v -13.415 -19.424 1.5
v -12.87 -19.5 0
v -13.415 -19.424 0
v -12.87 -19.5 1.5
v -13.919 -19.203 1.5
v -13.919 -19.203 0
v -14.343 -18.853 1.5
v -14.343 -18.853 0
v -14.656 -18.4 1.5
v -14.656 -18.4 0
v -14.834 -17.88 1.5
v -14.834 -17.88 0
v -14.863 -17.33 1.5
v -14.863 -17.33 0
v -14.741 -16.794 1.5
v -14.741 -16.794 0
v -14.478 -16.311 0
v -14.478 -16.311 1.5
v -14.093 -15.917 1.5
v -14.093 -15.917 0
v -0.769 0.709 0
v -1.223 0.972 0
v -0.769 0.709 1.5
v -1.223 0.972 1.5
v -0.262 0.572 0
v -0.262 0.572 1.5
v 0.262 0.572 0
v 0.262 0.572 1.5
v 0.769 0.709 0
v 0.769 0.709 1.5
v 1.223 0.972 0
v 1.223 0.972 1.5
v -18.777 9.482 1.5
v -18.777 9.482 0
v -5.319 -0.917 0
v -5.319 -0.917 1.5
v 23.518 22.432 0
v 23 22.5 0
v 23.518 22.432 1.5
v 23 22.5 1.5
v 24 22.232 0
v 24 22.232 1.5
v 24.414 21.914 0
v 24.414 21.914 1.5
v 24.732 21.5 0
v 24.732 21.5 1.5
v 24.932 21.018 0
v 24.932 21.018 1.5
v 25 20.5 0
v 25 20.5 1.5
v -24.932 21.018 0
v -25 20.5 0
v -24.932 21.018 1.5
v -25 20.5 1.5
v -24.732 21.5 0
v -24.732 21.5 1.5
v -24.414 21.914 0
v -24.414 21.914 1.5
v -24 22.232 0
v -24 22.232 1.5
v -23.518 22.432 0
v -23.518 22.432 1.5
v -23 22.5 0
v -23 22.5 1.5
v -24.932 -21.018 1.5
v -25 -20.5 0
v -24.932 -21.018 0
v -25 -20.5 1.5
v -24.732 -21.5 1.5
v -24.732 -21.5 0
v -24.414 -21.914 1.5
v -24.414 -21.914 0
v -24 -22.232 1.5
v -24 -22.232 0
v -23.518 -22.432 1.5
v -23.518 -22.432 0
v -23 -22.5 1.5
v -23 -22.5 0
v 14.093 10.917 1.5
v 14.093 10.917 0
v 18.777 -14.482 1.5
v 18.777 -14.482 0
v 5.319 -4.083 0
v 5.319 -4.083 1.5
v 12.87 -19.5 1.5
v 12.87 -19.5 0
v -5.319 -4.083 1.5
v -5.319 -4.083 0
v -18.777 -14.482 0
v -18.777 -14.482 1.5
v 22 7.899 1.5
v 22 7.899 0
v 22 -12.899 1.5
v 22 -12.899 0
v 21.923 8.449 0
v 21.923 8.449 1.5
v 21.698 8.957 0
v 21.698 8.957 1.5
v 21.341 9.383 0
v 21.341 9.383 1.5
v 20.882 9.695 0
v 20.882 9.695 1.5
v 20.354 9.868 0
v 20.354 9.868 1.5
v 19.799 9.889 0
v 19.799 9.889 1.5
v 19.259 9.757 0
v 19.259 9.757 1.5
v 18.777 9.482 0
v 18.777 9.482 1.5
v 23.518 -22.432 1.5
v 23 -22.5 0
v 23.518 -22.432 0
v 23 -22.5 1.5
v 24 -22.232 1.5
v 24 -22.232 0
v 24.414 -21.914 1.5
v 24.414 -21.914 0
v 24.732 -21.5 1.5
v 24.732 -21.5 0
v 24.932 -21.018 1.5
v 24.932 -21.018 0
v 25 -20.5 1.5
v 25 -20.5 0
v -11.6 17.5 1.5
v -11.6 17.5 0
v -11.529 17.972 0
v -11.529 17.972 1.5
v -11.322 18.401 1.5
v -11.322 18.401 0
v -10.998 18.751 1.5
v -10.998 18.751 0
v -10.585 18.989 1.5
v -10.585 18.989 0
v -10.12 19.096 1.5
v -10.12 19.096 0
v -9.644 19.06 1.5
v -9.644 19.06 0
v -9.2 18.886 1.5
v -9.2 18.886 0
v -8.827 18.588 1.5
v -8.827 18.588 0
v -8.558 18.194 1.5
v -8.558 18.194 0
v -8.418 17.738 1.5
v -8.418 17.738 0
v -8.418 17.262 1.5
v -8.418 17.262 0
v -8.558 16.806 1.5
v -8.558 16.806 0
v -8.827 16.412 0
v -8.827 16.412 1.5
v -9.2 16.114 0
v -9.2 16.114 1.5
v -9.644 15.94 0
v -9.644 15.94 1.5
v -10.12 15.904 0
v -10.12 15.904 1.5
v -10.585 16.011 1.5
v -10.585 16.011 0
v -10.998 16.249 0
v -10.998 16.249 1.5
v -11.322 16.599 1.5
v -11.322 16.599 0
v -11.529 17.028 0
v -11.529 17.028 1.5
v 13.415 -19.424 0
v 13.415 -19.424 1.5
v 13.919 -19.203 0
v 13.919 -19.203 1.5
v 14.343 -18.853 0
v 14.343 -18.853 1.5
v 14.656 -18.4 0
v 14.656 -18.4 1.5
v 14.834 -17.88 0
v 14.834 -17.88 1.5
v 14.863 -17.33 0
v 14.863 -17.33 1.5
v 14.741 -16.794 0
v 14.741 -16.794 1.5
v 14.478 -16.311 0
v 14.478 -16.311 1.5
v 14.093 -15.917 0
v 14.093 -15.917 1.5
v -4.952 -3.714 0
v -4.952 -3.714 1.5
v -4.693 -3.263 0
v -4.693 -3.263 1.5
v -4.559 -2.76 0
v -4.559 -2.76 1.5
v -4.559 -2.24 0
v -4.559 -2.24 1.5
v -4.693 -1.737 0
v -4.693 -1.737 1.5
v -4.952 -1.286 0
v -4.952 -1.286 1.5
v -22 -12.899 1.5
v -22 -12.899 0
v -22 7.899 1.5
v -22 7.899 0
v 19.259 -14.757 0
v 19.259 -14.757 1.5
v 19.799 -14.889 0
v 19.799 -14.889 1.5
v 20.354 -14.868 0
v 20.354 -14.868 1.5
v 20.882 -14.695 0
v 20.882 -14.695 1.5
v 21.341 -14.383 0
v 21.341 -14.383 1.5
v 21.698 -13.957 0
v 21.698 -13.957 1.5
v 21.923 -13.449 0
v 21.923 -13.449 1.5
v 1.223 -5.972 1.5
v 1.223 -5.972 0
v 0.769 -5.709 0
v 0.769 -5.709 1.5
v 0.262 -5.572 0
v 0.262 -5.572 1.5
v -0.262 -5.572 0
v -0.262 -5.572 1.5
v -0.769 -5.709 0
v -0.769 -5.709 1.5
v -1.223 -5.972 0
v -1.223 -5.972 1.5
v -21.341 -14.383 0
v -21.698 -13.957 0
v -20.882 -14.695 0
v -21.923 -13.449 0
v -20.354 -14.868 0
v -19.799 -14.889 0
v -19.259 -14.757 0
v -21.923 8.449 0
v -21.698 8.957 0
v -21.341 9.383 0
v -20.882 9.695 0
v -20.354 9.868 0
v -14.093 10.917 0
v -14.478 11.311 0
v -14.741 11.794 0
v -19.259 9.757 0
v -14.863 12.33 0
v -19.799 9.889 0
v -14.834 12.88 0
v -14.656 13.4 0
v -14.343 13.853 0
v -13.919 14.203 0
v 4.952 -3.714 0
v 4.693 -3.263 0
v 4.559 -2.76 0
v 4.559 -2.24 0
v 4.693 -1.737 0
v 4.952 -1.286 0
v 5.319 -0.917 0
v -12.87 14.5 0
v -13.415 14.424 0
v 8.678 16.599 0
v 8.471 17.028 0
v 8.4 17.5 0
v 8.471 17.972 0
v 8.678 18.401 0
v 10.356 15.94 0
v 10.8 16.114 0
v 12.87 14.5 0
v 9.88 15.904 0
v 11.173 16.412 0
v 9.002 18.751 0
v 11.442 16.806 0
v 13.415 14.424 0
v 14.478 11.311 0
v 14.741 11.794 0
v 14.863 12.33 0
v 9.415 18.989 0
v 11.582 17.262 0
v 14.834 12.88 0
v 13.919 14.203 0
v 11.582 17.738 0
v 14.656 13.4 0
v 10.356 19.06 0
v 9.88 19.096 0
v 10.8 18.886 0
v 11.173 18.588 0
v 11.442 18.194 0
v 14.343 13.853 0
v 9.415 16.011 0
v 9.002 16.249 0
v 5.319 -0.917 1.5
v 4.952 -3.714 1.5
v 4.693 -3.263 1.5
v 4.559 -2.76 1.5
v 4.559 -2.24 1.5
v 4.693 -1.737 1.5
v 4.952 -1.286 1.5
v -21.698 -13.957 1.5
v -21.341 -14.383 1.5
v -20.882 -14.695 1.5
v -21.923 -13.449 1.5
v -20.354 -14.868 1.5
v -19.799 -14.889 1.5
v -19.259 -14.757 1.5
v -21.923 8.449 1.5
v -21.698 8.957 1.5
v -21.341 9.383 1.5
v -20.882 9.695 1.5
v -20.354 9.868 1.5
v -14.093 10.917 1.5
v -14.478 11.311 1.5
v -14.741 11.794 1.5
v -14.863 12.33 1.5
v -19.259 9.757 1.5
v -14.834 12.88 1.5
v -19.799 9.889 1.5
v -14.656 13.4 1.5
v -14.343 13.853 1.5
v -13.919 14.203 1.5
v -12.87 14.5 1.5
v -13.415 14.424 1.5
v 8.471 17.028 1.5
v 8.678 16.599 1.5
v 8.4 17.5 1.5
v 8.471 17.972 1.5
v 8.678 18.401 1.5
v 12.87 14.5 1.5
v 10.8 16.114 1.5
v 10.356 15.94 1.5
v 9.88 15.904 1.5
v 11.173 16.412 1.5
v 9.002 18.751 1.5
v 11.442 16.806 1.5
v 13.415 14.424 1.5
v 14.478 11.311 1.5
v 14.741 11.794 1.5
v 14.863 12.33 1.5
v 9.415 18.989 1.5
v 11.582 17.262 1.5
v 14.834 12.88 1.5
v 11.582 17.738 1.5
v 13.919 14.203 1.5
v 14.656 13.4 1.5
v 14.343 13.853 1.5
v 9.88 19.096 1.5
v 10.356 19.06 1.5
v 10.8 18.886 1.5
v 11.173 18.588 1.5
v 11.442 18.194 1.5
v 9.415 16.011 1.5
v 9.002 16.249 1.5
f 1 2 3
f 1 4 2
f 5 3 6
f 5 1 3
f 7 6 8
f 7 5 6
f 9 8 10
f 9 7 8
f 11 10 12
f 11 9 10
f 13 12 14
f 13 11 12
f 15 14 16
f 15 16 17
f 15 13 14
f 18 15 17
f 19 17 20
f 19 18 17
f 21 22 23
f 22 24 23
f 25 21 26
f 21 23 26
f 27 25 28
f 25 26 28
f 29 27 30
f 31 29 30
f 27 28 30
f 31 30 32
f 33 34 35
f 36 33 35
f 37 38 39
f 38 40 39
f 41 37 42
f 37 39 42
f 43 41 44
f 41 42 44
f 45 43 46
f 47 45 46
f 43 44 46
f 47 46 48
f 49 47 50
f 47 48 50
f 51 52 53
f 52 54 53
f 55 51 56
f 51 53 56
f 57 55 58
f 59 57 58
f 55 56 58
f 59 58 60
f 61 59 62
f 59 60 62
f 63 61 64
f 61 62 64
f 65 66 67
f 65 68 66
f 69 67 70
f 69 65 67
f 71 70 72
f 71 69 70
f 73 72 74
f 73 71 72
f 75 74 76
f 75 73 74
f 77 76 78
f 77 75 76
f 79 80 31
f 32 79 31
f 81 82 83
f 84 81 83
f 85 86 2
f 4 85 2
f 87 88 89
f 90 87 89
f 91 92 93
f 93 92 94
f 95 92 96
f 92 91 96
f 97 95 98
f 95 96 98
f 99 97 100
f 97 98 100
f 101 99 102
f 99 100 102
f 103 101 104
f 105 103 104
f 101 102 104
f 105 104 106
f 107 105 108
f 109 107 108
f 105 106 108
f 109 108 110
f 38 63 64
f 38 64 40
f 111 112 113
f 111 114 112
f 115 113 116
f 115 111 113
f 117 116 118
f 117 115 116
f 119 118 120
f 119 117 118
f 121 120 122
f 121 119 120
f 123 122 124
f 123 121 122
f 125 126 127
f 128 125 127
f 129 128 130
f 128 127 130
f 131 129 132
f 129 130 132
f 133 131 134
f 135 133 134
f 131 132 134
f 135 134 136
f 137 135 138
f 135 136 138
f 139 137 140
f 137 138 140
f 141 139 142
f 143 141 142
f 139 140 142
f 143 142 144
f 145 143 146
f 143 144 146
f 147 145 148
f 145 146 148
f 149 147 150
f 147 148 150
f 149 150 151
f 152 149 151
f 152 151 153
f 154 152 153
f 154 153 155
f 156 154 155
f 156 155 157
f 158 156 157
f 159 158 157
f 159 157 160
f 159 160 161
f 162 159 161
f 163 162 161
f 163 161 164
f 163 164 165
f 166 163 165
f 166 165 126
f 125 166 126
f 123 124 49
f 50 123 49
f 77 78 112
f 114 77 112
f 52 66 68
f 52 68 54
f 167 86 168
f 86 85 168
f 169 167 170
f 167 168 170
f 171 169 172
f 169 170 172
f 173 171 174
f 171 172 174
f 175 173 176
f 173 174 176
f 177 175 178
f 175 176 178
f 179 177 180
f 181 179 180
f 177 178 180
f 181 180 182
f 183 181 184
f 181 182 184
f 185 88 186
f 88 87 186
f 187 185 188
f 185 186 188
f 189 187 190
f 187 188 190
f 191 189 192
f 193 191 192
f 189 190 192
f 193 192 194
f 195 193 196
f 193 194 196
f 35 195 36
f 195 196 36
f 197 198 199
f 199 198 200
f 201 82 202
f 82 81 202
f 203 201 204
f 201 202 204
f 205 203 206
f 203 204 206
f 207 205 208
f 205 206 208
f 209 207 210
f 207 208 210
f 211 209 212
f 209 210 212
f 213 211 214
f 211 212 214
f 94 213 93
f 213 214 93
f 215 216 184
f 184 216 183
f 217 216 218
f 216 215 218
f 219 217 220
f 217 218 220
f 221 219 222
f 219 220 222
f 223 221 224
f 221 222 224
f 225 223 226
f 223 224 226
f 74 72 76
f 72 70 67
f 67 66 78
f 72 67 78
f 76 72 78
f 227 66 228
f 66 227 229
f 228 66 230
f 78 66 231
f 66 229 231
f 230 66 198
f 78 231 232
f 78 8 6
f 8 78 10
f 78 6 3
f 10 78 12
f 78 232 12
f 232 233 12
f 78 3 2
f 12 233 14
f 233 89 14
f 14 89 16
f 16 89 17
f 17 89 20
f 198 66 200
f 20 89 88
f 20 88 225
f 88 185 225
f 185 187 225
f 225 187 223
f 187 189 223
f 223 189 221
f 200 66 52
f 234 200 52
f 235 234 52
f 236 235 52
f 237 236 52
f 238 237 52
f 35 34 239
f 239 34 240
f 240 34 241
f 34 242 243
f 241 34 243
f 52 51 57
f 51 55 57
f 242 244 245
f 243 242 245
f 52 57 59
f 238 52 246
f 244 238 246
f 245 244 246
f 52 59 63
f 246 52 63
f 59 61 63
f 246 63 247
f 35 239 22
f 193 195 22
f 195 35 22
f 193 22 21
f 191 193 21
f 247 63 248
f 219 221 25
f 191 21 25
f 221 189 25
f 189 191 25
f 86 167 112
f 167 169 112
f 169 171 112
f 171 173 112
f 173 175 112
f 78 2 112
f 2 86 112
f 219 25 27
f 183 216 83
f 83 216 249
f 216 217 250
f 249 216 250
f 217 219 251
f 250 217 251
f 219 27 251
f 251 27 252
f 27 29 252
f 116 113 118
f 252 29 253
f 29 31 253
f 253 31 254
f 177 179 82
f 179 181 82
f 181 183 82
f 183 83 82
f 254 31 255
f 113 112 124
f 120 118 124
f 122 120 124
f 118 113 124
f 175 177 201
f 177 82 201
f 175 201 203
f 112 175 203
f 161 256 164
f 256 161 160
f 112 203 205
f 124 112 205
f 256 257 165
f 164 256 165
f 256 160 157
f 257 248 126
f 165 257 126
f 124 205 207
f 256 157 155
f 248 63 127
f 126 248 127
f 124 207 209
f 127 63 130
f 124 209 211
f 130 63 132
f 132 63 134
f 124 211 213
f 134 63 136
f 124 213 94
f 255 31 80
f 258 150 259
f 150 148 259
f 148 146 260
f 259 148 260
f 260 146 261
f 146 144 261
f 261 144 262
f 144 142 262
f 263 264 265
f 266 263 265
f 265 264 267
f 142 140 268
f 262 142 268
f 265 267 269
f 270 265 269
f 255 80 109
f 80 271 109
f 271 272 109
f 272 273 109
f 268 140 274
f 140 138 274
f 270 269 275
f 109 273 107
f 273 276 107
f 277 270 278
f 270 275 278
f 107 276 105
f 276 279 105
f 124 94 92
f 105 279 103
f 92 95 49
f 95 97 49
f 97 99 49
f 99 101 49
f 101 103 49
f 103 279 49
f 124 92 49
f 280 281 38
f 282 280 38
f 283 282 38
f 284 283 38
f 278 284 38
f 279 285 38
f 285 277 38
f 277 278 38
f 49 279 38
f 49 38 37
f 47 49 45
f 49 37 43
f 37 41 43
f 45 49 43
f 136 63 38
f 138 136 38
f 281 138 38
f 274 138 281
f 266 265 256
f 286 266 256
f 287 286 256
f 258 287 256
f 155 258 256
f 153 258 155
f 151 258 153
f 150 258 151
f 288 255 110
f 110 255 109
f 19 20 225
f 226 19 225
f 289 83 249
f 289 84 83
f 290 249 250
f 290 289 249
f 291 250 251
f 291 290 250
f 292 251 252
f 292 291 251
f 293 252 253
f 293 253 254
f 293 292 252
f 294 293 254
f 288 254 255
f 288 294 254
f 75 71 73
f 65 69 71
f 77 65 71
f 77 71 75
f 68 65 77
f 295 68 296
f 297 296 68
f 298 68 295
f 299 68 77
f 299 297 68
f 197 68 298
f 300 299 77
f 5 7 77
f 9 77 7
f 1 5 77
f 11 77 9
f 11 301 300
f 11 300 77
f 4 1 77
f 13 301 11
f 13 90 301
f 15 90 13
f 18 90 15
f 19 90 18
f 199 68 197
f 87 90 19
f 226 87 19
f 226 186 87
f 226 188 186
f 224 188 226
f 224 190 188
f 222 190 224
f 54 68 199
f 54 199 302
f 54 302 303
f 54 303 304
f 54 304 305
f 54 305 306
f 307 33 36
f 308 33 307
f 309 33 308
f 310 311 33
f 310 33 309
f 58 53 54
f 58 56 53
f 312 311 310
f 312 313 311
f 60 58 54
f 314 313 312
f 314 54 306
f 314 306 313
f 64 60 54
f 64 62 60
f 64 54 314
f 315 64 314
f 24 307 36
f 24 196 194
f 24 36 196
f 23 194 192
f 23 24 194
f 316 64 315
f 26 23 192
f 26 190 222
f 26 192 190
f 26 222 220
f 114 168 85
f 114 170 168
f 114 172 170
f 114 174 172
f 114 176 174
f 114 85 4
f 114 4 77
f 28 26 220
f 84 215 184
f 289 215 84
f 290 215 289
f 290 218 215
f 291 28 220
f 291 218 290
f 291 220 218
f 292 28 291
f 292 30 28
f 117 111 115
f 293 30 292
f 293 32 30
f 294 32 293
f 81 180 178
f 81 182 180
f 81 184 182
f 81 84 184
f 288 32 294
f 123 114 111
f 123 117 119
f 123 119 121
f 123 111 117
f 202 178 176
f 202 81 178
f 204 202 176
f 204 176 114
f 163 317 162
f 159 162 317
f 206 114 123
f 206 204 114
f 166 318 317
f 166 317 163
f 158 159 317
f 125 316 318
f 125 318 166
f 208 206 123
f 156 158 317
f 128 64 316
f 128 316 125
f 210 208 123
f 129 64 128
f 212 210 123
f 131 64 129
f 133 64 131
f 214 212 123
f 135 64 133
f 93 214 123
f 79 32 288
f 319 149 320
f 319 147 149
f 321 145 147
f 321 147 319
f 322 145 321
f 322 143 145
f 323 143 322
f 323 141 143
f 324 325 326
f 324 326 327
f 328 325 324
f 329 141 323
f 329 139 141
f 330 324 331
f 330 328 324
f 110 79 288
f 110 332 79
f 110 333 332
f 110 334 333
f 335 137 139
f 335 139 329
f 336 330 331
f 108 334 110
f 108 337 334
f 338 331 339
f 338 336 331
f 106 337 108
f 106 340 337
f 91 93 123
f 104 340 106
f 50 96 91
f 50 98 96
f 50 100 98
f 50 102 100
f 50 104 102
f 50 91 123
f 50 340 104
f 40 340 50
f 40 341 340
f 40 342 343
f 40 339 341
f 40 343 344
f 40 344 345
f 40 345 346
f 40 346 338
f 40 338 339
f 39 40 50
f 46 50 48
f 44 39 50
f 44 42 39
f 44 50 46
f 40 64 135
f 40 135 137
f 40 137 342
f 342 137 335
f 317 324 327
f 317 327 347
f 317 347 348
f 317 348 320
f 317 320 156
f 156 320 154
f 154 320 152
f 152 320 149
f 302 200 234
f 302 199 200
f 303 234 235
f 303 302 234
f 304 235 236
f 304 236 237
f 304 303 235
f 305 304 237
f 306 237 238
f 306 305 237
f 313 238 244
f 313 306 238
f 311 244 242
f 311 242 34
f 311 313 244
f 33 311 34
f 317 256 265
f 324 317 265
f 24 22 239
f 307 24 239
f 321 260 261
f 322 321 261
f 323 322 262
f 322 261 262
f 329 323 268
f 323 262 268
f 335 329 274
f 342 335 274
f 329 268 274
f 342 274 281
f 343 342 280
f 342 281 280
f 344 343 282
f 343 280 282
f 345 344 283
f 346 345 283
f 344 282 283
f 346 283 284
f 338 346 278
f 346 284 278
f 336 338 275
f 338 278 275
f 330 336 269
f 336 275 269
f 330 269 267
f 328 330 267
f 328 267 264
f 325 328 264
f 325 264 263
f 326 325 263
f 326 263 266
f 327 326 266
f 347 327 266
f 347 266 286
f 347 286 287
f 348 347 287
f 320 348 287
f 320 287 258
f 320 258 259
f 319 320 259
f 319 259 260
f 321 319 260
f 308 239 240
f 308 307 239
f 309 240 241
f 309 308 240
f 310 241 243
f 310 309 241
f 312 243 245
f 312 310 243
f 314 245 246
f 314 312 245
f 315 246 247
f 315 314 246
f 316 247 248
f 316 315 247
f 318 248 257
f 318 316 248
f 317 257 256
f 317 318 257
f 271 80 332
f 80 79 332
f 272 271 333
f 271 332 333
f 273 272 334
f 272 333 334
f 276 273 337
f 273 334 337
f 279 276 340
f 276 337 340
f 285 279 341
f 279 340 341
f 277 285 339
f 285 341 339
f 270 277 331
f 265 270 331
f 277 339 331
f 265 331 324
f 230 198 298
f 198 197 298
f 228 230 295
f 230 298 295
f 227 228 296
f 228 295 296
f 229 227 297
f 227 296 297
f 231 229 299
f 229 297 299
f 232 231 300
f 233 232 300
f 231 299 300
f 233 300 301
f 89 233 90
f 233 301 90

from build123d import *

# Parameters (mm, degrees)
SKETCH_1_W          = 50
SKETCH_1_H          = 45
EXTRUDE_1_DEPTH     = 1.5
SKETCH_2_R          = 1.6
CUT_EXTRUDE_1_DEPTH = 2
FILLET_1_R          = 2


with BuildPart() as part:
    # 草图1 → 凸台-拉伸1 (new body)
    with BuildSketch(Plane.XY):
        Rectangle(SKETCH_1_W, SKETCH_1_H)
    extrude(amount=EXTRUDE_1_DEPTH)

    # 草图2 → 切除-拉伸1 (cut)
    with BuildSketch(Plane(origin=(0, 0, 0), x_dir=(-1, 0, 0), z_dir=(0, 0, -1))):
        Polygon((18.72907323, 14.5), (-18.72907323, 14.5), (0, 0.027534323), align=None)
        Polygon((-3.27092677, -2.5), (-22, 11.972465677), (-22, -16.972465677), align=None)
        Polygon((18.72907323, -19.5), (0, -5.027534323), (-18.72907323, -19.5), align=None)
        Polygon((22, 11.972465677), (3.27092677, -2.5), (22, -16.972465677), align=None)
        with Locations((-10, 17.5)):
            Circle(SKETCH_2_R)
        with Locations((10, 17.5)):
            Circle(SKETCH_2_R)
    extrude(amount=-CUT_EXTRUDE_1_DEPTH, mode=Mode.SUBTRACT)

    # 圆角1
    fillet_1_edges = [part.edges().sort_by_distance(p)[0] for p in [
        (-3.27092677, -2.5, 0.75),
        (-22, 11.972465677, 0.75),
        (-22, -16.972465677, 0.75),
        (22, -16.972465677, 0.75),
        (22, 11.972465677, 0.75),
        (3.27092677, -2.5, 0.75),
        (18.72907323, -19.5, 0.75),
        (0, -5.027534323, 0.75),
        (-18.72907323, -19.5, 0.75),
        (0, 0.027534323, 0.75),
        (18.72907323, 14.5, 0.75),
        (-18.72907323, 14.5, 0.75),
        (25, -22.5, 0.75),
        (-25, -22.5, 0.75),
        (-25, 22.5, 0.75),
        (25, 22.5, 0.75),
    ]]
    fillet(fillet_1_edges, radius=FILLET_1_R)


solid = part.part
